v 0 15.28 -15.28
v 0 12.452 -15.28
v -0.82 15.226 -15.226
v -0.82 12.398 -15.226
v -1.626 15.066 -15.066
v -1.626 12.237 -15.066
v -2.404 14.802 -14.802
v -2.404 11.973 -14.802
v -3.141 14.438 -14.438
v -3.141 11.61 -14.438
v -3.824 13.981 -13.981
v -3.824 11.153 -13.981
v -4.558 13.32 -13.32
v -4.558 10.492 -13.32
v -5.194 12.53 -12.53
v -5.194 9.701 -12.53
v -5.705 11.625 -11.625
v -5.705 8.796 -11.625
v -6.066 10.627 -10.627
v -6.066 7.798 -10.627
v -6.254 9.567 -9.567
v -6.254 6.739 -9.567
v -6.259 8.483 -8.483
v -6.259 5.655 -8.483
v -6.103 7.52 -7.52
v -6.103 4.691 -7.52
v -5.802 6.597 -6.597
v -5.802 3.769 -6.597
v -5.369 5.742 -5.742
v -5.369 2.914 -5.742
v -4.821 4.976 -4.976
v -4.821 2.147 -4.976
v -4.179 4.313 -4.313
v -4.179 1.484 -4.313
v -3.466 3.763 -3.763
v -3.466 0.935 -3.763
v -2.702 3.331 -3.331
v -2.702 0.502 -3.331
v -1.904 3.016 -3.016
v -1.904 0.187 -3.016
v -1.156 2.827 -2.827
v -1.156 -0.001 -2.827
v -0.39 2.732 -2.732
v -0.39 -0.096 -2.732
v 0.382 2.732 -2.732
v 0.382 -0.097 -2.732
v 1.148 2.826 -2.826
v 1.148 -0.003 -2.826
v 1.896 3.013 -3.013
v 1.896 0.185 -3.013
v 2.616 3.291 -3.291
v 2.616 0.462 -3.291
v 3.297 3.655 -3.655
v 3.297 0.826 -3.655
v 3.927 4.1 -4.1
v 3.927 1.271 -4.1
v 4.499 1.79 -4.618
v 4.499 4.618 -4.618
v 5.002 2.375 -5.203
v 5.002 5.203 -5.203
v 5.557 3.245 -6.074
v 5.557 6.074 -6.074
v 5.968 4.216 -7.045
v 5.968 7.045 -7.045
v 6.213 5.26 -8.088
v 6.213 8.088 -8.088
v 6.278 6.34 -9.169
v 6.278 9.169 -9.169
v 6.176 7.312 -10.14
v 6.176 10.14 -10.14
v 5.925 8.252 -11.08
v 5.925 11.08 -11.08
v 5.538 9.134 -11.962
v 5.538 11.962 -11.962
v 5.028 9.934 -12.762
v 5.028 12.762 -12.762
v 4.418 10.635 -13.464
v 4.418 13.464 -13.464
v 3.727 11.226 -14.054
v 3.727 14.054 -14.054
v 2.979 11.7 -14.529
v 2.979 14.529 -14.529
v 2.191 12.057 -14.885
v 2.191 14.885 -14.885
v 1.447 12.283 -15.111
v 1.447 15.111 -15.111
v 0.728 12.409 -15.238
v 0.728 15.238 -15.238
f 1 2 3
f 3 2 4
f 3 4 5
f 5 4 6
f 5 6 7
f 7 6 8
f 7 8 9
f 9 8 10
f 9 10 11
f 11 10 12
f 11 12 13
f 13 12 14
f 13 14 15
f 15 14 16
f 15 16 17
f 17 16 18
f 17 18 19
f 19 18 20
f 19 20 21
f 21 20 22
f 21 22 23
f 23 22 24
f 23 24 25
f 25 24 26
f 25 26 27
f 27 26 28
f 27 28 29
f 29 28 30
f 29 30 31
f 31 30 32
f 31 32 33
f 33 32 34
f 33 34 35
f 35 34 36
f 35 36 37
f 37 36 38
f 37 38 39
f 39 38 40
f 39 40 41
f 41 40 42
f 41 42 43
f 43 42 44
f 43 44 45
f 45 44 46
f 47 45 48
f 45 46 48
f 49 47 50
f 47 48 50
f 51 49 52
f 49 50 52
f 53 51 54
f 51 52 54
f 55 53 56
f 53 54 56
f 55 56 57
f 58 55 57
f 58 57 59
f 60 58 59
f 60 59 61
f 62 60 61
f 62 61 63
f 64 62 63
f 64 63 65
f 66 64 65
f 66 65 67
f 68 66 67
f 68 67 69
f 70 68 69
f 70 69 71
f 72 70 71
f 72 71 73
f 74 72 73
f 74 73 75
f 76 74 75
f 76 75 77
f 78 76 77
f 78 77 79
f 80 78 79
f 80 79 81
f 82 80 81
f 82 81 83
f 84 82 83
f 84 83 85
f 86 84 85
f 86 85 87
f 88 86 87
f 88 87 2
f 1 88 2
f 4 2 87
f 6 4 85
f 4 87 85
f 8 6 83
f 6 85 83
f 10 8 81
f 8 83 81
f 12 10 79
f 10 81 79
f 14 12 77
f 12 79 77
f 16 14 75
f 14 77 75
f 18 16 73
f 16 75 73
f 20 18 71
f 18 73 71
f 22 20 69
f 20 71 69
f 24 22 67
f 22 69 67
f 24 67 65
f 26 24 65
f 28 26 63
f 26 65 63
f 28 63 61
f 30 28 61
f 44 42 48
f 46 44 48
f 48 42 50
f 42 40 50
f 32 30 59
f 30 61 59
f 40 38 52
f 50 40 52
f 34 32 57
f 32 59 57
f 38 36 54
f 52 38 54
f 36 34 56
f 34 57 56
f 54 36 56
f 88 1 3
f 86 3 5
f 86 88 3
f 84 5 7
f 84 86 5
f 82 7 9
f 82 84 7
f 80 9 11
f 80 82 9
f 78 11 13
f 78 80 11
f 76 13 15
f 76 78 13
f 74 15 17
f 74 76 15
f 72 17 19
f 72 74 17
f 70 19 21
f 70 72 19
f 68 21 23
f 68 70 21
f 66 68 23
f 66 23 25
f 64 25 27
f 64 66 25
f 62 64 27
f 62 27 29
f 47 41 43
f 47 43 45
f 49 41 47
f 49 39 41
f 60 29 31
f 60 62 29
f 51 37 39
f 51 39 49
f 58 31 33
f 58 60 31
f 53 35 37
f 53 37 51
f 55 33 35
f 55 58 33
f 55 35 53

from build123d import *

# Parameters (mm, degrees)
SKETCH2_R               = 20
BOSS_EXTRUDE1_DEPTH     = 2
CUT_EXTRUDE2_DEPTH      = 46.628938186
CUT_EXTRUDE2_DEPTH_BACK = 46.628938186
SKETCH6_R               = 25.059608459
SKETCH6_R_2             = 6.28
SKETCH3_R               = 7.4
SKETCH3_R_2             = 5.9
BOSS_EXTRUDE2_DEPTH     = 1
SKETCH7_R               = 13.022061682
CUT_EXTRUDE3_DEPTH      = 1


with BuildPart() as part:
    # Sketch2 → Boss-Extrude1 (new body)
    with BuildSketch(Plane(origin=(0, 0, 0), x_dir=(1, 0, 0), z_dir=(0, 0.7071067811865464, 0.7071067811865488))):
        with Locations(Location((0, 20, 0), (0, 0, 270))):
            Circle(SKETCH2_R)
    extrude(amount=-BOSS_EXTRUDE1_DEPTH)

    # Sketch6 → Cut-Extrude2 (cut, two sides: drawn at the far end of the back side and taken through both)
    with BuildSketch(Plane(origin=(0, 0, 0), x_dir=(1, 0, 0), z_dir=(0, 1, 0)).offset(-CUT_EXTRUDE2_DEPTH_BACK)):
        with Locations((0, 9)):
            Circle(SKETCH6_R)
        with Locations(Location((0, 9, 0), (0, 0, 90))):
            Circle(SKETCH6_R_2, mode=Mode.SUBTRACT)
    extrude(amount=CUT_EXTRUDE2_DEPTH + CUT_EXTRUDE2_DEPTH_BACK, mode=Mode.SUBTRACT)


with BuildPart() as body_2:
    # Sketch3 → Boss-Extrude2 (new body)
    with BuildSketch(Plane(origin=(0, -3.25, 0), x_dir=(1, 0, 0), z_dir=(0, 1, 0))):
        with Locations(Location((0, 7.4, 0), (0, 0, 270))):
            Circle(SKETCH3_R)
        with Locations(Location((0, 7.4, 0), (0, 0, 270))):
            Circle(SKETCH3_R_2, mode=Mode.SUBTRACT)
    extrude(amount=BOSS_EXTRUDE2_DEPTH)

    # Sketch7 → Cut-Extrude3 (cut)
    with BuildSketch(Plane.XZ.offset(3.25)):
        with Locations((0.290894274, -7.517427113)):
            Circle(SKETCH7_R)
    extrude(amount=-CUT_EXTRUDE3_DEPTH, mode=Mode.SUBTRACT)


solid = part.part
